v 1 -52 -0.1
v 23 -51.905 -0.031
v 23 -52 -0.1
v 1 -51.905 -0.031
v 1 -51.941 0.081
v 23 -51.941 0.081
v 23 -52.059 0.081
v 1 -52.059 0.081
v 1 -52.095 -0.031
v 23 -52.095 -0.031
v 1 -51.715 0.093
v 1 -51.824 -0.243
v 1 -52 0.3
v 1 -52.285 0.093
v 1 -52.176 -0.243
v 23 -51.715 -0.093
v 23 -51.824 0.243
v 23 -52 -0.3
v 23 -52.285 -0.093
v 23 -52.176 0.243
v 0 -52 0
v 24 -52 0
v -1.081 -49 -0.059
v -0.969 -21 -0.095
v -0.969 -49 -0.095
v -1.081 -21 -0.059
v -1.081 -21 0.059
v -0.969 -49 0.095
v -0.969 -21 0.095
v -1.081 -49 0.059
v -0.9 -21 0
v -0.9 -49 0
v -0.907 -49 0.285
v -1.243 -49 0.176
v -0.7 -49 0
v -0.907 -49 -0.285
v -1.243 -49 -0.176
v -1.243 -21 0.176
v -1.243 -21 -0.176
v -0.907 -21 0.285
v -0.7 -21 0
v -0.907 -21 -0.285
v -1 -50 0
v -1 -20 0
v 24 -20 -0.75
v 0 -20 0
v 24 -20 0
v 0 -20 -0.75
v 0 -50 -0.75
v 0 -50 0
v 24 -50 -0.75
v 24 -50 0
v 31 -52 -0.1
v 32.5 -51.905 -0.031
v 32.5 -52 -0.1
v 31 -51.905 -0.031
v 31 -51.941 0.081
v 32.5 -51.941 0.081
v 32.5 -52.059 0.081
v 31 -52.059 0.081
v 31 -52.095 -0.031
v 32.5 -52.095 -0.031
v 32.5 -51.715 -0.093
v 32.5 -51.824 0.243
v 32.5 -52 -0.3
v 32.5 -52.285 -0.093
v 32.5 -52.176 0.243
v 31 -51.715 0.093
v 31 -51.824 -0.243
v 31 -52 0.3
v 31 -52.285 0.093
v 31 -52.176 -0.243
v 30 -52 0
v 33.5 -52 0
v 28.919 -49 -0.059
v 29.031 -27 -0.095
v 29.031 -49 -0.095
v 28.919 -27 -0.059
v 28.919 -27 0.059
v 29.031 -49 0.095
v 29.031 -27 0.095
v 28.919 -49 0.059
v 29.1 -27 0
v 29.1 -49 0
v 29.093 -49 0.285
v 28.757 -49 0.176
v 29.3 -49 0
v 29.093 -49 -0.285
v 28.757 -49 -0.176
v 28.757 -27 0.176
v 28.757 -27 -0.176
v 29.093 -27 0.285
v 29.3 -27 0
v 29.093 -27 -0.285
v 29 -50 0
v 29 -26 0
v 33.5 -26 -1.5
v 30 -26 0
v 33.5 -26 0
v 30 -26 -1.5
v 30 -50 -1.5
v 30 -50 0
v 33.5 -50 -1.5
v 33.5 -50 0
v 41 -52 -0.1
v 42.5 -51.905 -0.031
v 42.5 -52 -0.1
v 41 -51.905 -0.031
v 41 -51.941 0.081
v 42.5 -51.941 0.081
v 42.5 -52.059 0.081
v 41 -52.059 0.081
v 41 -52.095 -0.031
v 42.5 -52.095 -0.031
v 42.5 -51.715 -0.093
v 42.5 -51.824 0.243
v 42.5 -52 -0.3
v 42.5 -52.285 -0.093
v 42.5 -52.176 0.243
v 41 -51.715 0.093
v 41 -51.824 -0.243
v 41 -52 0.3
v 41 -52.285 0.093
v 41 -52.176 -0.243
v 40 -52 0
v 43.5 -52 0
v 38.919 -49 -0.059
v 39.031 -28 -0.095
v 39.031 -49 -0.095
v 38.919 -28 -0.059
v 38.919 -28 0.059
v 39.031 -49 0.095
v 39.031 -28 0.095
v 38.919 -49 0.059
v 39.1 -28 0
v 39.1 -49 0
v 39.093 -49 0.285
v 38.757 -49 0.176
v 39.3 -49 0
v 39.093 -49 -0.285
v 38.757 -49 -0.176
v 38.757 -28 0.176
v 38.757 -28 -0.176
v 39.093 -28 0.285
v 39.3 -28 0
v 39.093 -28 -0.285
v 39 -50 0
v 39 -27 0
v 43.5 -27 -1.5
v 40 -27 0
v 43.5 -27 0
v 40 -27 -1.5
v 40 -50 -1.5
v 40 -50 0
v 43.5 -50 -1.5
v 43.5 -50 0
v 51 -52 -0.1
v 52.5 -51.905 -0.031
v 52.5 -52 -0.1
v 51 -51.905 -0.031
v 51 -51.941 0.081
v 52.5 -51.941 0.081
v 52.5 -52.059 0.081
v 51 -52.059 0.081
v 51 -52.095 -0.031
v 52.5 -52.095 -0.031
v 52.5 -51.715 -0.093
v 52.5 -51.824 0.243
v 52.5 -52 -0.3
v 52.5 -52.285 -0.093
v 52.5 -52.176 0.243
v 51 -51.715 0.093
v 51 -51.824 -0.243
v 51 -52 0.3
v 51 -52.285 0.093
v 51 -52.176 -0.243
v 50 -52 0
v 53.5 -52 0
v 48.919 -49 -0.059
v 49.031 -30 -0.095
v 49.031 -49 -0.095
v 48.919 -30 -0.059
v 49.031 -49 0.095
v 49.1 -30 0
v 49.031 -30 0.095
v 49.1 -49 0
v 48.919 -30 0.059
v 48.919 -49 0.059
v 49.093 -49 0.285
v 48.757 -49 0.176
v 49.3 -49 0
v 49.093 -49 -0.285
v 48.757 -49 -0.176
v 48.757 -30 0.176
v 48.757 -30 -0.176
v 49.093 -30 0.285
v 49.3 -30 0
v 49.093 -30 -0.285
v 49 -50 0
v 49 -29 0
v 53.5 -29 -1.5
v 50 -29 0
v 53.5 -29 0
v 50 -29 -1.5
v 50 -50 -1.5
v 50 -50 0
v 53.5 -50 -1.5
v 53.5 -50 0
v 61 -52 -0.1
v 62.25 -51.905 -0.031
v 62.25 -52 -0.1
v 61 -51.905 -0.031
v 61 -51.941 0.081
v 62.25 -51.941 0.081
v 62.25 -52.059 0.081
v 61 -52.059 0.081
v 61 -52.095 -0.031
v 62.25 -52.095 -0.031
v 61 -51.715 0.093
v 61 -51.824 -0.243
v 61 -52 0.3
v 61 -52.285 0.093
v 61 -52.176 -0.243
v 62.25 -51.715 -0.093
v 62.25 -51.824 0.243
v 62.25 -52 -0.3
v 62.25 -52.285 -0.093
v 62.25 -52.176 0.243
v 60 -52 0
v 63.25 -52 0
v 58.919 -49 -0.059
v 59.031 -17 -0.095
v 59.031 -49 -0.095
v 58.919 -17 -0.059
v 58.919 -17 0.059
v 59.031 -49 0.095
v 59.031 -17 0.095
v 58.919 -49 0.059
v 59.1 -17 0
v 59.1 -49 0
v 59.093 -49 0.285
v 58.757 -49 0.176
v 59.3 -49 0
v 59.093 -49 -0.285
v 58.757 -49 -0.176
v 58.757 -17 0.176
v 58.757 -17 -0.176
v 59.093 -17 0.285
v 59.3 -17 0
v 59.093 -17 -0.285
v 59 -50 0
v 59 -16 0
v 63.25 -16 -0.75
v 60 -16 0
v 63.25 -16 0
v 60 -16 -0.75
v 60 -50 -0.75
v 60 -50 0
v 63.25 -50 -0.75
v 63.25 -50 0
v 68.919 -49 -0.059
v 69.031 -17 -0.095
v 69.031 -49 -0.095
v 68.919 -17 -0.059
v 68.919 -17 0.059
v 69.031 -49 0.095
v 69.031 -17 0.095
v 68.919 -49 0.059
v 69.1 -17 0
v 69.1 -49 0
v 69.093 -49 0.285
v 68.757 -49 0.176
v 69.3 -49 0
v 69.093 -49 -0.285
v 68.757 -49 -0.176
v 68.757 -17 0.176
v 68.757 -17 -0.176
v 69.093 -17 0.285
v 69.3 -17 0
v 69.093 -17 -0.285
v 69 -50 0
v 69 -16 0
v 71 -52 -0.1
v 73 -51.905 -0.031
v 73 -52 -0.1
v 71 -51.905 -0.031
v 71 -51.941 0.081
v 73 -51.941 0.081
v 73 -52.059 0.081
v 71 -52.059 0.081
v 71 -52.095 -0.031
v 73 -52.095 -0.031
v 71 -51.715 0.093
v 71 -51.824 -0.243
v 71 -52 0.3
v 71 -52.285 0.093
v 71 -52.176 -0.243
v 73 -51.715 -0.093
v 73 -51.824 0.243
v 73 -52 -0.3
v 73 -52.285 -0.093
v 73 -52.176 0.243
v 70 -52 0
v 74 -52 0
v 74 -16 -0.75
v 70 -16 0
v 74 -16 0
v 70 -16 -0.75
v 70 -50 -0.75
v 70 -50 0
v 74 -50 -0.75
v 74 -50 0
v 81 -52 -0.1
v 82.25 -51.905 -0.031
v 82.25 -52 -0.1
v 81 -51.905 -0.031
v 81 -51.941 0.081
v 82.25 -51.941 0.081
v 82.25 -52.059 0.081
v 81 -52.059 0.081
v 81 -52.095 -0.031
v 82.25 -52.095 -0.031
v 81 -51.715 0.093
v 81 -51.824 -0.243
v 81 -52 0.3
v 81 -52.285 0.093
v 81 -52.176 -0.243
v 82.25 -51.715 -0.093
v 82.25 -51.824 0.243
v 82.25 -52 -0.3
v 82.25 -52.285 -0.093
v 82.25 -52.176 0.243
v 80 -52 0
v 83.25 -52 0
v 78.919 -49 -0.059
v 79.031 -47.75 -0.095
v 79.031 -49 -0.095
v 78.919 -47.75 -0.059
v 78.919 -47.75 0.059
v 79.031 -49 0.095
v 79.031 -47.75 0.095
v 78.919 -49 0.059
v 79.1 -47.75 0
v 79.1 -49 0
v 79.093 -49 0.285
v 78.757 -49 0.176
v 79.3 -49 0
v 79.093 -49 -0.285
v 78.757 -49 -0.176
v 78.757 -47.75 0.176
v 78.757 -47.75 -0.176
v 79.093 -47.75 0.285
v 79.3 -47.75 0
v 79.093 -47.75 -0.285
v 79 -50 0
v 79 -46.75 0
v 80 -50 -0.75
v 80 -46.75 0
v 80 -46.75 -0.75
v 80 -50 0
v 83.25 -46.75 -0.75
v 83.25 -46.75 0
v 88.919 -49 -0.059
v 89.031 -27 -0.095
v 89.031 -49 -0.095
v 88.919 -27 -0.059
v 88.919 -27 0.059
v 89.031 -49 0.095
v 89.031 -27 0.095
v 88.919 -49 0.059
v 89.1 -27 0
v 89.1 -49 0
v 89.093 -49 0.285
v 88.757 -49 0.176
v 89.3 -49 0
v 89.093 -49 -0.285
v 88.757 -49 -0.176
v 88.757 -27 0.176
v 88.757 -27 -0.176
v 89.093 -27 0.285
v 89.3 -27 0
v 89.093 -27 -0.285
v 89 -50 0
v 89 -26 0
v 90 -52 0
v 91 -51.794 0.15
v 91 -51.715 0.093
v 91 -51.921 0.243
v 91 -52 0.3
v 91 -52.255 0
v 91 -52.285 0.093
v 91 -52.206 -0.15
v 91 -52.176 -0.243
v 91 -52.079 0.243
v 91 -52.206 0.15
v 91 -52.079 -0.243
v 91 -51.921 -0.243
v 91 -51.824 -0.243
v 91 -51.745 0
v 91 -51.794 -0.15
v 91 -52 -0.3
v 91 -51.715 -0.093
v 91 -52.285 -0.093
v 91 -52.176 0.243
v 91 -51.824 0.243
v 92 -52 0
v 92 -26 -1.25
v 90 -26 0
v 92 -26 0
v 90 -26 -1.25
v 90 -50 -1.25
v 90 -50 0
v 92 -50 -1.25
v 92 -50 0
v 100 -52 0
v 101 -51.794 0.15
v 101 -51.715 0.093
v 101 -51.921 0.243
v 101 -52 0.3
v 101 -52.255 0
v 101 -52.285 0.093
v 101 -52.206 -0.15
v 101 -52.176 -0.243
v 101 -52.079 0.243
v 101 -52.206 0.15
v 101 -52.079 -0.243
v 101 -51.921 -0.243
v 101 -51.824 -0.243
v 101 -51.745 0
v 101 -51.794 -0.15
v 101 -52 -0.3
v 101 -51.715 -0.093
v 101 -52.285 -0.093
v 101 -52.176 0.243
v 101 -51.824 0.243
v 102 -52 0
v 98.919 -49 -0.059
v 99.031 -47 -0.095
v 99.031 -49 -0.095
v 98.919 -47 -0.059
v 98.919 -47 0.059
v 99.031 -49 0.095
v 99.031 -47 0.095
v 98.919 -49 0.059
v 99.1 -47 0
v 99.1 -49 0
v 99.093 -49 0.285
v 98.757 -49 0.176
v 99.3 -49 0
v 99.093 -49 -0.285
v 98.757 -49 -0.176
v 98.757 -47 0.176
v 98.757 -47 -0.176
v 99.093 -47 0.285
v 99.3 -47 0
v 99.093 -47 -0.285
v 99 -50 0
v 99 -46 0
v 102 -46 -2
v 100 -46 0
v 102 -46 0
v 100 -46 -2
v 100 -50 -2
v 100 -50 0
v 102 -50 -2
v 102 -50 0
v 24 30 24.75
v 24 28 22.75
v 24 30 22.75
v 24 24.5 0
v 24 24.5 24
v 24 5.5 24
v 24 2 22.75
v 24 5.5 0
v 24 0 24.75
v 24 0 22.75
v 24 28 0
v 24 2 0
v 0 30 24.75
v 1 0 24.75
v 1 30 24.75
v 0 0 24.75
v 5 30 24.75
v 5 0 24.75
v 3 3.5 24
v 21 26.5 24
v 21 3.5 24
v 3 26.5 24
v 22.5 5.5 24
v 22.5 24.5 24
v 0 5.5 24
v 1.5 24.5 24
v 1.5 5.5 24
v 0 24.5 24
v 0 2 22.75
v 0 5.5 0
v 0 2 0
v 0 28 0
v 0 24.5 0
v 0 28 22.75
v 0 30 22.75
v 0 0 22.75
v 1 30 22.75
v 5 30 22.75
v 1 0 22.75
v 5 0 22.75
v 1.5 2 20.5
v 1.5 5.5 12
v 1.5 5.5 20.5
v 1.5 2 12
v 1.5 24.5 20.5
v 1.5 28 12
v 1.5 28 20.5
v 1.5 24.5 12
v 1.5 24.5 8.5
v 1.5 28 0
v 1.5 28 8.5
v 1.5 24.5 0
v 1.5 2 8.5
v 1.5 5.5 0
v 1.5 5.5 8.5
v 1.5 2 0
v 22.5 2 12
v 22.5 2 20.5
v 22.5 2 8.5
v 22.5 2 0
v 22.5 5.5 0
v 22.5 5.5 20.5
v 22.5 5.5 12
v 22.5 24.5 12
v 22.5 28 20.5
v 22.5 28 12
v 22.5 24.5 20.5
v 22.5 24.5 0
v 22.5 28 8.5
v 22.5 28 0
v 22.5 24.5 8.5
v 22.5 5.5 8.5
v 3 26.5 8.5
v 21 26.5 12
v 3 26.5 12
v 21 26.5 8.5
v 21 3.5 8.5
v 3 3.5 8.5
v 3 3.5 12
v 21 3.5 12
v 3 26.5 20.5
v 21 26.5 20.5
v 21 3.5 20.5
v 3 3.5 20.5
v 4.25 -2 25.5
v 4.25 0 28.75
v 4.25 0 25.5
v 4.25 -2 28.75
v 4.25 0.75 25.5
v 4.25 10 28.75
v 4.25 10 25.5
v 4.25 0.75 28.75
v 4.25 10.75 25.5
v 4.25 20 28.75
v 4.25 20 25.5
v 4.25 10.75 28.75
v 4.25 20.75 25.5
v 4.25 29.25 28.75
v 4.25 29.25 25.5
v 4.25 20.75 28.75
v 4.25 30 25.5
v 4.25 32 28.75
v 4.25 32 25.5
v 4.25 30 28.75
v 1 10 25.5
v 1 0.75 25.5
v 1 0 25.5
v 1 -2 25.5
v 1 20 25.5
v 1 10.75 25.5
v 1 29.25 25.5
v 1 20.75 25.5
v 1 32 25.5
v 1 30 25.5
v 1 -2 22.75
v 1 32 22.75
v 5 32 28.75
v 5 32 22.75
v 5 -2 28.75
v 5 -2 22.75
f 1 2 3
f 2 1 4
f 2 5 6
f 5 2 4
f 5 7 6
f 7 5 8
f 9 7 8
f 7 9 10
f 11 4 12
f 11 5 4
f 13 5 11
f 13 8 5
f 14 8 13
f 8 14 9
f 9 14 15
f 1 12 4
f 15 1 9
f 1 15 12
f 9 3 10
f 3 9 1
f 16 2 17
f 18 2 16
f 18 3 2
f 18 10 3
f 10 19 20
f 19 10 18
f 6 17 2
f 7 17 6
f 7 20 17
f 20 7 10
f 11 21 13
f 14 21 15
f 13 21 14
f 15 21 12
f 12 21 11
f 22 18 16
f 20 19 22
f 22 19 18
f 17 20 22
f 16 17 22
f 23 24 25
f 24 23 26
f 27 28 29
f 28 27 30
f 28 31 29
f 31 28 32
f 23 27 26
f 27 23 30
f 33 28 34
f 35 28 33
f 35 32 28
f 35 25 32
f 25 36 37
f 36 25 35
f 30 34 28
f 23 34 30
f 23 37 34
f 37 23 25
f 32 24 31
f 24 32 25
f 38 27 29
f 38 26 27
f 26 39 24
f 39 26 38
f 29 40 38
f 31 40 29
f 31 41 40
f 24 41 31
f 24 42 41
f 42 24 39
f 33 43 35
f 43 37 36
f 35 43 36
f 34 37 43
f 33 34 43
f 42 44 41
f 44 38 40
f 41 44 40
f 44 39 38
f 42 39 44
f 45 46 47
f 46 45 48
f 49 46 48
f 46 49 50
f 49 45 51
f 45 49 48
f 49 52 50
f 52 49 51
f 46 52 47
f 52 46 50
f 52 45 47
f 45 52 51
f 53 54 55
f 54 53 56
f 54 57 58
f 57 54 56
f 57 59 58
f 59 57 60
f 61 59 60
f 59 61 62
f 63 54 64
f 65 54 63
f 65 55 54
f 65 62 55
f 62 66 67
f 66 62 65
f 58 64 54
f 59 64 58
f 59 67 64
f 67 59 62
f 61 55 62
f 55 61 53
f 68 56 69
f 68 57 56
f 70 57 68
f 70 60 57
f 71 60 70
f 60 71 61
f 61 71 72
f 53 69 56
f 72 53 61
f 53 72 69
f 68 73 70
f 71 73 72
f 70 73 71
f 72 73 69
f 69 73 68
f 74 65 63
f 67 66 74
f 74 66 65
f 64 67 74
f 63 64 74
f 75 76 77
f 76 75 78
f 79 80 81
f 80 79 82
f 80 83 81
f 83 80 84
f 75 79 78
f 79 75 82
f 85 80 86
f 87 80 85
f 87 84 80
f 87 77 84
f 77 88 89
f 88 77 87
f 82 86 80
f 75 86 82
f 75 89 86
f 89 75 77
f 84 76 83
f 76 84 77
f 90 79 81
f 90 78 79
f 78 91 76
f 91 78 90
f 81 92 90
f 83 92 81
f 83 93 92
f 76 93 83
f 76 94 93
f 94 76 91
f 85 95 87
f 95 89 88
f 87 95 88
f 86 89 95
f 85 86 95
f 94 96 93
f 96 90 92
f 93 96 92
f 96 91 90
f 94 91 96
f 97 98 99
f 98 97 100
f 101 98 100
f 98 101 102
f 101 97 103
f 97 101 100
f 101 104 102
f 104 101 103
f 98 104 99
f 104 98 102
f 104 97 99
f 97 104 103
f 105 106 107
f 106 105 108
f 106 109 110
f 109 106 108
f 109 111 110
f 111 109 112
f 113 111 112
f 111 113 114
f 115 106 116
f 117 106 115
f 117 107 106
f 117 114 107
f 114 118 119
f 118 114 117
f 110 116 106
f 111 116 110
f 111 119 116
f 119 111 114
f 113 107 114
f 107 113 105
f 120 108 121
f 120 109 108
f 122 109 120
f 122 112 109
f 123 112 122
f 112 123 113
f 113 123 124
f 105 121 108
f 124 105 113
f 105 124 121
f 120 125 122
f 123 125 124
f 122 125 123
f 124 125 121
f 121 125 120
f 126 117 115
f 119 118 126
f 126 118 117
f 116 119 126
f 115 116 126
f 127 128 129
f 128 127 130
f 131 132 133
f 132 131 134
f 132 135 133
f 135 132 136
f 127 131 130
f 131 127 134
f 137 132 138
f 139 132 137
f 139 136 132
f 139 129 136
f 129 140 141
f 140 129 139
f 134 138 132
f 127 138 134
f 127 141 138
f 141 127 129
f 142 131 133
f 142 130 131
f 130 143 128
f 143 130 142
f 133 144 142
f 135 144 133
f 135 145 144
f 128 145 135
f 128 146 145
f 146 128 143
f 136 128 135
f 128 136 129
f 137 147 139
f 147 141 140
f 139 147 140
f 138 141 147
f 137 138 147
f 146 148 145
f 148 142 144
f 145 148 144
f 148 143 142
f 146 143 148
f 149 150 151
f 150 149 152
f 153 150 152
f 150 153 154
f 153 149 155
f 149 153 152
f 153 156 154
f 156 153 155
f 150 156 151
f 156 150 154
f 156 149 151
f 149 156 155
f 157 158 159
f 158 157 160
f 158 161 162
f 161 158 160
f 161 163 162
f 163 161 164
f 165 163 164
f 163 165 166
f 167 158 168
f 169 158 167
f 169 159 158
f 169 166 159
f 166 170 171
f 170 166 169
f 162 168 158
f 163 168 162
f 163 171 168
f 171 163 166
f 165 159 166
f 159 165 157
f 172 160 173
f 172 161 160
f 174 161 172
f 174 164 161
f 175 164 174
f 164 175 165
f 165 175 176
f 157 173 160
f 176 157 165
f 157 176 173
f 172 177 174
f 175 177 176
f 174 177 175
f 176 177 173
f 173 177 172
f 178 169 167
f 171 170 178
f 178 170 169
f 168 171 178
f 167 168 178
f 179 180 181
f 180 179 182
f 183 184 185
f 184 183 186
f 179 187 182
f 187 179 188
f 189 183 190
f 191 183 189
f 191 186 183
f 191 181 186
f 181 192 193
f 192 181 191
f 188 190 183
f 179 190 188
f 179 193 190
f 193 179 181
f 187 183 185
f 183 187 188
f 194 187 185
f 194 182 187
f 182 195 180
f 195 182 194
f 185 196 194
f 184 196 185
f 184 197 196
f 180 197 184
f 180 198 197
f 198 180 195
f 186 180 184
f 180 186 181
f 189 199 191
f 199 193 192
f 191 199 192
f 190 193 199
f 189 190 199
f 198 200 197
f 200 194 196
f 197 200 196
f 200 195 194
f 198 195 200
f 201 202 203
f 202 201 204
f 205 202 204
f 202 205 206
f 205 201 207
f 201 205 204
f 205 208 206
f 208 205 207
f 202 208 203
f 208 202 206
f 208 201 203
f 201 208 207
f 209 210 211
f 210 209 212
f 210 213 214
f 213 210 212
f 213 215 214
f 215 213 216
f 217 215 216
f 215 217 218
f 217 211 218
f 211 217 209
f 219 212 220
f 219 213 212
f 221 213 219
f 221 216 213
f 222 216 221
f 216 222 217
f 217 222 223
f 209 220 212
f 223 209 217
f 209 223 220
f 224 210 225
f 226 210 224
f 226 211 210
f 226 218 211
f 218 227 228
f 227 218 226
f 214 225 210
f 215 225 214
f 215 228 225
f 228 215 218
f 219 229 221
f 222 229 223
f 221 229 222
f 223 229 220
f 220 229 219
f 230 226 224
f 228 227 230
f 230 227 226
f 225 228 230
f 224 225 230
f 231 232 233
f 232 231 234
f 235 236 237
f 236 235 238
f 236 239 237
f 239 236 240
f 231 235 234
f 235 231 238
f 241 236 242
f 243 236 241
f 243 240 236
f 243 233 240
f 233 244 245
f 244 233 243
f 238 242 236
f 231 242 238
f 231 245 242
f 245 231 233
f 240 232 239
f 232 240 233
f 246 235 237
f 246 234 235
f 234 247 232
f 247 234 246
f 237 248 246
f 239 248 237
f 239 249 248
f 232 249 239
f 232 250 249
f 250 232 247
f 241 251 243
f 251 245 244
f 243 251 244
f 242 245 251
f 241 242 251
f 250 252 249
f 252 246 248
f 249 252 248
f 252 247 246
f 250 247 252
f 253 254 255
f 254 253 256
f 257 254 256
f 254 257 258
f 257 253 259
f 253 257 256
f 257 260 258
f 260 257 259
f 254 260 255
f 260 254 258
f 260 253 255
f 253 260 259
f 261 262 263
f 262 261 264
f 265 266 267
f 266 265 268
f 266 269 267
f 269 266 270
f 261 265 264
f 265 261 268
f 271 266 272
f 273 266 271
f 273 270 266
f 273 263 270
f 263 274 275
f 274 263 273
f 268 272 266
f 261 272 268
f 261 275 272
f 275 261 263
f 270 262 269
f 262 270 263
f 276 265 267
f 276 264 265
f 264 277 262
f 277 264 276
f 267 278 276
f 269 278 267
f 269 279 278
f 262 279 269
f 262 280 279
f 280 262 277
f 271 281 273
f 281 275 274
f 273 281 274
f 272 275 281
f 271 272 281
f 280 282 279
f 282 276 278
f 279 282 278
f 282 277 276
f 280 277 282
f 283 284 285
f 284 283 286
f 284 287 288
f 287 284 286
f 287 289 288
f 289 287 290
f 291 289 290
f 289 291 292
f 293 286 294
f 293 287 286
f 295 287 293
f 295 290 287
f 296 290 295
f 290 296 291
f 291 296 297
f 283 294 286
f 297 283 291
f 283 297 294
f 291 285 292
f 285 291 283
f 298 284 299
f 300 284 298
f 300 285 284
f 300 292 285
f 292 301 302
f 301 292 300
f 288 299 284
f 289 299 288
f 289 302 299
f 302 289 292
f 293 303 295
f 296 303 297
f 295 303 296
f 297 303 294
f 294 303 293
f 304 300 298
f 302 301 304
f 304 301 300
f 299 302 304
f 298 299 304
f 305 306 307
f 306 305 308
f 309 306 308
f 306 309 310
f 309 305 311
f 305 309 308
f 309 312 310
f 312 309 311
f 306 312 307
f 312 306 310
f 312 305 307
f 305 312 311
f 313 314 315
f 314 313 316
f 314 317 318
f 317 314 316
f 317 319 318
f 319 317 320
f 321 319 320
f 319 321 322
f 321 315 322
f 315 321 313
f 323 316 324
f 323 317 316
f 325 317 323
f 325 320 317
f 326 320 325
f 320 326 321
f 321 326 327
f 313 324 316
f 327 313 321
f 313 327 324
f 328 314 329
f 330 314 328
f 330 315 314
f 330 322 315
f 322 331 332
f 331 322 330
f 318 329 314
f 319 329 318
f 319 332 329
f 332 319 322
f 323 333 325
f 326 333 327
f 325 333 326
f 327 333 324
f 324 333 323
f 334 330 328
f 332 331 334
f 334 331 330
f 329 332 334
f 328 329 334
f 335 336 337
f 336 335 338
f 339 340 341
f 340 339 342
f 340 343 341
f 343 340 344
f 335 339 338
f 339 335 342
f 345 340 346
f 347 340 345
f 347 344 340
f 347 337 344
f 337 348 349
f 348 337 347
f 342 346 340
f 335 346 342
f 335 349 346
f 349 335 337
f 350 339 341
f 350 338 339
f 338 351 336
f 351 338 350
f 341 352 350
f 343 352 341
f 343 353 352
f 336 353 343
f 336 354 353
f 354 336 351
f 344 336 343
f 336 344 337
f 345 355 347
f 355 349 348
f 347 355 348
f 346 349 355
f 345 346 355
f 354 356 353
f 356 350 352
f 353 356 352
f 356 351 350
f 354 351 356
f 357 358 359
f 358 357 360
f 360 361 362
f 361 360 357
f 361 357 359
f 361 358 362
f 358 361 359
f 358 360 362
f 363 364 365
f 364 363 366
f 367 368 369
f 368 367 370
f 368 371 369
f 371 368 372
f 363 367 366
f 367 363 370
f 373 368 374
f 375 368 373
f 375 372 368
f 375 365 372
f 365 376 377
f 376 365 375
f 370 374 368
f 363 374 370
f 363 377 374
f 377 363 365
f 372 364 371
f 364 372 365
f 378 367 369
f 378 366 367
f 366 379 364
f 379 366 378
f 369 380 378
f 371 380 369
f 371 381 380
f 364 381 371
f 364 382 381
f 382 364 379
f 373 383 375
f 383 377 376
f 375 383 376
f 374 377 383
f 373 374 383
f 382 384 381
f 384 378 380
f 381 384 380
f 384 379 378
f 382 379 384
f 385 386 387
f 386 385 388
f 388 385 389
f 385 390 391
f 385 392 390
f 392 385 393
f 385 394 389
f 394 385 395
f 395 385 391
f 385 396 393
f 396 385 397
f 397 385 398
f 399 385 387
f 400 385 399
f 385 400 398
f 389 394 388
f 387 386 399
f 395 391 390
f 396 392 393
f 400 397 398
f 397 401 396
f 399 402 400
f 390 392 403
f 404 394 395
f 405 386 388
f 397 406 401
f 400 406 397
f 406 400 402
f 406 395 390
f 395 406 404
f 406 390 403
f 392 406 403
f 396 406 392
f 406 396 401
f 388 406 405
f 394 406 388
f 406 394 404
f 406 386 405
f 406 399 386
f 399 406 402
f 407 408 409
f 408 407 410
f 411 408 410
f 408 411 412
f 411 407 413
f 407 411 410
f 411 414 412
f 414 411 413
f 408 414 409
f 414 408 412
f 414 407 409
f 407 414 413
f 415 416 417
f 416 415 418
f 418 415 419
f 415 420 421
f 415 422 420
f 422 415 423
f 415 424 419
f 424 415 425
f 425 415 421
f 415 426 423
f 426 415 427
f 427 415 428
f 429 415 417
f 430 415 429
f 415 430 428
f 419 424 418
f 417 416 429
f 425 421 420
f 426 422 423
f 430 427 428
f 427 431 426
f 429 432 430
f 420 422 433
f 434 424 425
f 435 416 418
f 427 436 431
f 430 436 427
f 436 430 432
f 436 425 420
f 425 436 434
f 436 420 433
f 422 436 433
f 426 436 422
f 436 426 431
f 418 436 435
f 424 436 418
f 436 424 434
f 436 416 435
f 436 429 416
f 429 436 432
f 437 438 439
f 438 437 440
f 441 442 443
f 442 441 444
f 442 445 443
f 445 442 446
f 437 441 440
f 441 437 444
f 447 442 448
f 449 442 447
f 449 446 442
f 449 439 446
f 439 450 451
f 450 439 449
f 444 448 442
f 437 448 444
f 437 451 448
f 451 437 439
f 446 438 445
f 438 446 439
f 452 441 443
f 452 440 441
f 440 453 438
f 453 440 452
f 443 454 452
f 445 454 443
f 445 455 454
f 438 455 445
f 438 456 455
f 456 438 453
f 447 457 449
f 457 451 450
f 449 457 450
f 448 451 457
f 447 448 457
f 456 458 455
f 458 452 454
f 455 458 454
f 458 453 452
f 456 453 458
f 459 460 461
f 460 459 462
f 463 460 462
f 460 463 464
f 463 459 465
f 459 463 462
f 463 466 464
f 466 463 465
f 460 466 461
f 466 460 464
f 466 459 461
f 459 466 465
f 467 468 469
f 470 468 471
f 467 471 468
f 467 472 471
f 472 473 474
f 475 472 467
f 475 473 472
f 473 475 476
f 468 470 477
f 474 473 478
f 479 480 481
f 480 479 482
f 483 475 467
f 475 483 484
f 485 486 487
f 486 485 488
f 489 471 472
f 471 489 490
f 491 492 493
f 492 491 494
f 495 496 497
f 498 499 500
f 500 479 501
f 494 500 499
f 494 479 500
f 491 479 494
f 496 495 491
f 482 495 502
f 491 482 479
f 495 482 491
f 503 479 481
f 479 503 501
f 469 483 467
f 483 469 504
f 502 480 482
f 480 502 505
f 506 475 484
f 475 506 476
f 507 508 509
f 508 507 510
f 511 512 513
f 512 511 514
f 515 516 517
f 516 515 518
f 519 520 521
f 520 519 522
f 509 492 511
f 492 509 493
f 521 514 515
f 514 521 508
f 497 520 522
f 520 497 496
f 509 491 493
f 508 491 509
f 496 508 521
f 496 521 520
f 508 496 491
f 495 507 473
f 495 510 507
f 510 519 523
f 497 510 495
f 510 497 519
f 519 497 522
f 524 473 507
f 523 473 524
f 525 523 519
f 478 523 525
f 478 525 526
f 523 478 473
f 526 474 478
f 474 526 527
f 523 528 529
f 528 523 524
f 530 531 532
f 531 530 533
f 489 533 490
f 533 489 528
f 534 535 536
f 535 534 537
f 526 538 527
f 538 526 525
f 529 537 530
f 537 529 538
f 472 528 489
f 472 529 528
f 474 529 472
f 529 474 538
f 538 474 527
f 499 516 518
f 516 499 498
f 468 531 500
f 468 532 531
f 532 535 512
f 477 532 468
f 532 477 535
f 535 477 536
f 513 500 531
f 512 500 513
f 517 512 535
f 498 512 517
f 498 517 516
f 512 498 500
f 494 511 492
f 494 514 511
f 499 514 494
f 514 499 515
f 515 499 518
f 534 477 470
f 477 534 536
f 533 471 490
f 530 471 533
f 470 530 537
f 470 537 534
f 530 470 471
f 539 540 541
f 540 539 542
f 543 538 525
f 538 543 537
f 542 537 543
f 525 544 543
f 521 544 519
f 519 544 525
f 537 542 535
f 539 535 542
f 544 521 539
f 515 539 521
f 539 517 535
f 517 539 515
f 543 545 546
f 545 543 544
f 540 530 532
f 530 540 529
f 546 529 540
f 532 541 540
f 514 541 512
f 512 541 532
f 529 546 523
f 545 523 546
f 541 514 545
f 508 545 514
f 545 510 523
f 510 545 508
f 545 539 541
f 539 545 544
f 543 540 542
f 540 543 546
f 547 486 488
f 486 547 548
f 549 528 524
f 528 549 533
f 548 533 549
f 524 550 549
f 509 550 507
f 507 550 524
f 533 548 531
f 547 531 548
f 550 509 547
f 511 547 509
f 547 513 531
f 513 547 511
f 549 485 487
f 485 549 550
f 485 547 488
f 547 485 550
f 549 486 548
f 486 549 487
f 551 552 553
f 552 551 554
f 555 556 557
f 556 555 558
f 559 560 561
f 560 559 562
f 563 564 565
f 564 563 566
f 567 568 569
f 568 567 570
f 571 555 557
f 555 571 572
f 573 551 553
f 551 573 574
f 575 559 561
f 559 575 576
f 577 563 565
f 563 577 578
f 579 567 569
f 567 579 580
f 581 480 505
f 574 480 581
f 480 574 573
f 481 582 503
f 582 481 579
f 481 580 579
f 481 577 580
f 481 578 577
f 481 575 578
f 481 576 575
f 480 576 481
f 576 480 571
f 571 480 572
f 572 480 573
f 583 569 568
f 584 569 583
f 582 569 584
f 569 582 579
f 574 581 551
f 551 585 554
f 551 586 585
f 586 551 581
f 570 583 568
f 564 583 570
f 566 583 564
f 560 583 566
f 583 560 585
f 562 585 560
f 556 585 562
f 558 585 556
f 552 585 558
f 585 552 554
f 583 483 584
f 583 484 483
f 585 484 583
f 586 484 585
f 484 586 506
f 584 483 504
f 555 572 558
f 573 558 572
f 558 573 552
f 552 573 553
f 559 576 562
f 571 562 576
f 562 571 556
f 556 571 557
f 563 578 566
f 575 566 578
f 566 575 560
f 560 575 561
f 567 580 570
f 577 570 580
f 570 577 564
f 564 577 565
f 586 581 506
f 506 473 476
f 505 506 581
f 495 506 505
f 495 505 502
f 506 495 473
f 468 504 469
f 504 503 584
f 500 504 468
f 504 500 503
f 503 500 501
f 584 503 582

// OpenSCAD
// file: ../lib/common.scad
//--------------------------------------------------------------------------------------------------
// Module Prism
//--------------------------------------------------------------------------------------------------
module prism(z, y, x)
{
    rotate([0, 90, 0])
    {
        polyhedron(
                points=[[0,0,0], [x,0,0], [x,y,0], [0,y,0], [0,y,z], [x,y,z]],
                faces=[[0,1,2,3],[5,4,3,2],[0,4,5,1],[0,3,4],[5,2,1]]);
    }
}

//--------------------------------------------------------------------------------------------------
// Module Side panel
//--------------------------------------------------------------------------------------------------
module rect_cut(x, y, z, dx, dy)
{
    // Top panel
    translate([0, dy, 0])
    {
        cube([x, y - dy, z]);
    };

    // Left bottom panel
    translate([0, 0, 0])
    {
        cube([dx, dy, z]);
    };

    // Triangle
    translate([dx, 0, 0])
    {
        rotate([0, 0, 0])
        {
            prism(x - dx, dy, -z);
        }
    };
}

//--------------------------------------------------------------------------------------------------
// X dimensional arrow
//--------------------------------------------------------------------------------------------------
module arrow_x(l)
{
    line_w = 0.1;
    arrow_w = 1;
    arrow_h = 0.3;

    // Line
    translate([l / 2, 0, 0])
    {
        rotate([0, 90, 0])
        {
            color([0.4, 0.4, 0.4])
            cylinder(l - arrow_w * 2, line_w, line_w, true);
        }
    }

    // Left arrow
    translate([arrow_w, 0, 0])
    {
        rotate([0, 270, 0])
        {
            color([0.4, 0.4, 0.4])
            cylinder(arrow_w, arrow_h, 0, false);
        }
    }

    // Right arrow
    translate([l - arrow_w, 0, 0])
    {
        rotate([0, 90, 0])
        {
            color([0.4, 0.4, 0.4])
            cylinder(arrow_w, arrow_h, 0, false);
        }
    }

    // Text
    translate([l/3, 0.5, 0])
    {
        color([0.4, 0.4, 0.4])
        text(str(l), size=1);
    }
}

//--------------------------------------------------------------------------------------------------
// Y dimensional arrow
//--------------------------------------------------------------------------------------------------
module arrow_y(l)
{
    line_w = 0.1;
    arrow_w = 1;
    arrow_h = 0.3;

    // Line
    translate([0, l / 2, 0])
    {
        rotate([90, 0, 00])
        {
            color([0.4, 0.4, 0.4])
            cylinder(l - arrow_w * 2, line_w, line_w, true);
        }
    }

    // Left arrow
    translate([0 ,arrow_w, 0])
    {
        rotate([90, 0, 0])
        {
            color([0.4, 0.4, 0.4])
            cylinder(arrow_w, arrow_h, 0, false);
        }
    }

    // Right arrow
    translate([0, l - arrow_w, 0])
    {
        rotate([270, 0, 0])
        {
            color([0.4, 0.4, 0.4])
            cylinder(arrow_w, arrow_h, 0, false);
        }
    }

    // Text
    translate([-0.5, l/3, 0])
    {
        rotate([0 ,0, 90])
        {
            color([0.4, 0.4, 0.4])
            text(str(l), size=1);
        }
    }
}

//--------------------------------------------------------------------------------------------------
// Z dimensional arrow
//--------------------------------------------------------------------------------------------------
module arrow_z(l)
{
    line_w = 0.11;
    arrow_w = 1;
    arrow_h = 0.3;

    // Line
    translate([0, 0, l / 2])
    {
        rotate([0, 0, 0])
        {
            color([0.4, 0.4, 0.4])
            cylinder(l - arrow_w * 2, line_w, line_w, true);
        }
    }

    // Left arrow
    translate([0, 0, arrow_w])
    {
        rotate([0, 180, 0])
        {
            color([0.4, 0.4, 0.4])
            cylinder(arrow_w, arrow_h, 0, false);
        }
    }

    // Right arrow
    translate([0, 0, l - arrow_w])
    {
        rotate([0, 0, 0])
        {
            color([0.4, 0.4, 0.4])
            cylinder(arrow_w, arrow_h, 0, false);
        }
    }

    // Text
    translate([0.5, 0, l/3])
    {
        rotate([90 ,0, 90])
        {
            color([0.4, 0.4, 0.4])
            text(str(l), size=1);
        }
    }
}

//--------------------------------------------------------------------------------------------------
// parallelogram
//--------------------------------------------------------------------------------------------------
module parallelogram(x = 12, y = 12, z = 1, xd = 0)
{
    points = [
        [0, 0, 0 ],        //0
        [x, 0, 0 ],        //1
        [x + xd, y, 0],    //2
        [xd, y, 0 ],       //3
        [0, 0, z ],        //4
        [x, 0, z ],        //5
        [x + xd, y, z ],   //6
        [xd, y, z ]];      //7

    faces = [
        [0,1,2,3],         // bottom
        [4,5,1,0],         // front
        [7,6,5,4],         // top
        [5,6,2,1],         // right
        [6,7,3,2],         // back
        [7,4,0,3]];        // left

    polyhedron(points, faces);
}

//--------------------------------------------------------------------------------------------------
// common board
//--------------------------------------------------------------------------------------------------
module board(w, h, d, r, g, b)
{
    color([r, g, b])
    cube([w, h, d]);
}

//--------------------------------------------------------------------------------------------------
// board dimension
//--------------------------------------------------------------------------------------------------
module dimension(w, h, d, r, g, b, part_x, part_y)
{
    translate([part_x, -part_y, 0])
    {
        rotate([-90, 0, 0])
        {
            board(w, h, d, r, g, b);
        }
            
        translate([0, -2, 0])
        {
            color([0, 0, 0])
            arrow_x(w);
        };

        translate([-1, 0, 0])
        {
            color([0, 0, 0])
            arrow_y(d);
        };
    }
}
// main file
include <../lib/common.scad>

/*
Top: 30 X 24 
*/
// Top
translate([0, 0, 24])
{
    board(24, 30, 0.75, 0, 1, 0);
}
dimension(24, 0.75, 30, 0, 1, 0, 0, 50);

// Legs
translate([0, 2, 0])
{
    board(1.5, 3.5, 24, 1, 0, 0);
}
dimension(3.5, 1.5, 24, 1, 0, 0, 30, 50);

translate([22.5, 2, 0])
{
    board(1.5, 3.5, 24, 1, 0, 0);
}

translate([0, 24.5, 0])
{
    board(1.5, 3.5, 24, 1, 0, 0);
}

translate([22.5, 24.5, 0])
{
    board(1.5, 3.5, 24, 1, 0, 0);
}

// Blue
translate([1.5, 3.5, 12])
{
    rotate([-90, 0, 0])
    {
        board(1.5, 3.5, 23, 0, 0, 1);
    }
}
dimension(3.5, 1.5, 23, 0, 0, 1, 40, 50);

translate([21, 3.5, 12])
{
    rotate([-90, 0, 0])
    {
        board(1.5, 3.5, 23, 0, 0, 1);
    }
}

translate([1.5, 3.5, 24])
{
    rotate([-90, 0, 0])
    {
        board(1.5, 3.5, 23, 0, 0, 1);
    }
}

translate([21, 3.5, 24])
{
    rotate([-90, 0, 0])
    {
        board(1.5, 3.5, 23, 0, 0, 1);
    }
}

// Purple
translate([1.5, 2, 8.5])
{
    rotate([90, 0, 90])
    {
        board(1.5, 3.5, 21, 1, 0, 1);
    }
}
dimension(3.5, 1.5, 21, 1, 0, 1, 50, 50);

translate([1.5, 26.5, 8.5])
{
    rotate([90, 0, 90])
    {
        board(1.5, 3.5, 21, 1, 0, 1);
    }
}

translate([1.5, 2, 20.5])
{
    rotate([90, 0, 90])
    {
        board(1.5, 3.5, 21, 1, 0, 1);
    }
}

translate([1.5, 26.5, 20.5])
{
    rotate([90, 0, 90])
    {
        board(1.5, 3.5, 21, 1, 0, 1);
    }
}

// Fence
translate([1, -2, 24.75])
{
    rotate([0, 0, 0])
    {
        board(3.25, 34, 0.75, 0, 0.7, 0.7);
    }
}
dimension(3.25, 0.75, 34, 0, 0.7, 0.7, 60, 50);

translate([5, -2, 24.75])
{
    rotate([0, -90, 0])
    {
        board(4, 34, 0.75, 0.6, 1, 0);
    }
}
dimension(4, 0.75, 34, 0.6, 1, 0, 70, 50);

// Triangles
translate([4.25, 0, 28.75])
{
    rotate([-90, 0, 180])
    {
        color([1, 0.4, 0.9])
        prism(3.25, 3.25, 0.75);
    }
}
color([1, 0.4, 0.9])
translate([80, -50, 0])
{
    prism(3.25, 3.25, 0.75);
    translate([0, -2, 0])
    {
        color([0, 0, 0])
        arrow_x(3.25);
    }
    
    translate([-1, 0, 0])
    {
        color([0, 0, 0])
        arrow_y(3.25);
    }
}

translate([4.25, 10, 28.75])
{
    rotate([-90, 0, 180])
    {
        color([1, 0.4, 0.9])
        prism(3.25, 3.25, 0.75);
    }
}

translate([4.25, 20, 28.75])
{
    rotate([-90, 0, 180])
    {
        color([1, 0.4, 0.9])
        prism(3.25, 3.25, 0.75);
    }
}

translate([4.25, 29.25, 28.75])
{
    rotate([-90, 0, 180])
    {
        color([1, 0.4, 0.9])
        prism(3.25, 3.25, 0.75);
    }
}

// Clamp
translate([0, 0, 22.75])
{
    rotate([90, 0, 90])
    {
        board(2, 1.25, 24, 0, 0, 0);
    }
}
dimension(2, 1.25, 24, 0, 0, 0, 90, 50);

translate([0, 28, 22.75])
{
    rotate([90, 0, 90])
    {
        board(2, 1.25, 24, 0, 0, 0);
    }
}

translate([1, -2, 22.75])
{
    rotate([90, 0, 90])
    {
        board(2, 2, 4, 0.4, 0.7, 0.3);
    }
}
dimension(2, 2, 4, 0.4, 0.7, 0.3, 100, 50);

translate([1, 30, 22.75])
{
    rotate([90, 0, 90])
    {
        board(2, 2, 4, 0.4, 0.7, 0.3);
    }
}
